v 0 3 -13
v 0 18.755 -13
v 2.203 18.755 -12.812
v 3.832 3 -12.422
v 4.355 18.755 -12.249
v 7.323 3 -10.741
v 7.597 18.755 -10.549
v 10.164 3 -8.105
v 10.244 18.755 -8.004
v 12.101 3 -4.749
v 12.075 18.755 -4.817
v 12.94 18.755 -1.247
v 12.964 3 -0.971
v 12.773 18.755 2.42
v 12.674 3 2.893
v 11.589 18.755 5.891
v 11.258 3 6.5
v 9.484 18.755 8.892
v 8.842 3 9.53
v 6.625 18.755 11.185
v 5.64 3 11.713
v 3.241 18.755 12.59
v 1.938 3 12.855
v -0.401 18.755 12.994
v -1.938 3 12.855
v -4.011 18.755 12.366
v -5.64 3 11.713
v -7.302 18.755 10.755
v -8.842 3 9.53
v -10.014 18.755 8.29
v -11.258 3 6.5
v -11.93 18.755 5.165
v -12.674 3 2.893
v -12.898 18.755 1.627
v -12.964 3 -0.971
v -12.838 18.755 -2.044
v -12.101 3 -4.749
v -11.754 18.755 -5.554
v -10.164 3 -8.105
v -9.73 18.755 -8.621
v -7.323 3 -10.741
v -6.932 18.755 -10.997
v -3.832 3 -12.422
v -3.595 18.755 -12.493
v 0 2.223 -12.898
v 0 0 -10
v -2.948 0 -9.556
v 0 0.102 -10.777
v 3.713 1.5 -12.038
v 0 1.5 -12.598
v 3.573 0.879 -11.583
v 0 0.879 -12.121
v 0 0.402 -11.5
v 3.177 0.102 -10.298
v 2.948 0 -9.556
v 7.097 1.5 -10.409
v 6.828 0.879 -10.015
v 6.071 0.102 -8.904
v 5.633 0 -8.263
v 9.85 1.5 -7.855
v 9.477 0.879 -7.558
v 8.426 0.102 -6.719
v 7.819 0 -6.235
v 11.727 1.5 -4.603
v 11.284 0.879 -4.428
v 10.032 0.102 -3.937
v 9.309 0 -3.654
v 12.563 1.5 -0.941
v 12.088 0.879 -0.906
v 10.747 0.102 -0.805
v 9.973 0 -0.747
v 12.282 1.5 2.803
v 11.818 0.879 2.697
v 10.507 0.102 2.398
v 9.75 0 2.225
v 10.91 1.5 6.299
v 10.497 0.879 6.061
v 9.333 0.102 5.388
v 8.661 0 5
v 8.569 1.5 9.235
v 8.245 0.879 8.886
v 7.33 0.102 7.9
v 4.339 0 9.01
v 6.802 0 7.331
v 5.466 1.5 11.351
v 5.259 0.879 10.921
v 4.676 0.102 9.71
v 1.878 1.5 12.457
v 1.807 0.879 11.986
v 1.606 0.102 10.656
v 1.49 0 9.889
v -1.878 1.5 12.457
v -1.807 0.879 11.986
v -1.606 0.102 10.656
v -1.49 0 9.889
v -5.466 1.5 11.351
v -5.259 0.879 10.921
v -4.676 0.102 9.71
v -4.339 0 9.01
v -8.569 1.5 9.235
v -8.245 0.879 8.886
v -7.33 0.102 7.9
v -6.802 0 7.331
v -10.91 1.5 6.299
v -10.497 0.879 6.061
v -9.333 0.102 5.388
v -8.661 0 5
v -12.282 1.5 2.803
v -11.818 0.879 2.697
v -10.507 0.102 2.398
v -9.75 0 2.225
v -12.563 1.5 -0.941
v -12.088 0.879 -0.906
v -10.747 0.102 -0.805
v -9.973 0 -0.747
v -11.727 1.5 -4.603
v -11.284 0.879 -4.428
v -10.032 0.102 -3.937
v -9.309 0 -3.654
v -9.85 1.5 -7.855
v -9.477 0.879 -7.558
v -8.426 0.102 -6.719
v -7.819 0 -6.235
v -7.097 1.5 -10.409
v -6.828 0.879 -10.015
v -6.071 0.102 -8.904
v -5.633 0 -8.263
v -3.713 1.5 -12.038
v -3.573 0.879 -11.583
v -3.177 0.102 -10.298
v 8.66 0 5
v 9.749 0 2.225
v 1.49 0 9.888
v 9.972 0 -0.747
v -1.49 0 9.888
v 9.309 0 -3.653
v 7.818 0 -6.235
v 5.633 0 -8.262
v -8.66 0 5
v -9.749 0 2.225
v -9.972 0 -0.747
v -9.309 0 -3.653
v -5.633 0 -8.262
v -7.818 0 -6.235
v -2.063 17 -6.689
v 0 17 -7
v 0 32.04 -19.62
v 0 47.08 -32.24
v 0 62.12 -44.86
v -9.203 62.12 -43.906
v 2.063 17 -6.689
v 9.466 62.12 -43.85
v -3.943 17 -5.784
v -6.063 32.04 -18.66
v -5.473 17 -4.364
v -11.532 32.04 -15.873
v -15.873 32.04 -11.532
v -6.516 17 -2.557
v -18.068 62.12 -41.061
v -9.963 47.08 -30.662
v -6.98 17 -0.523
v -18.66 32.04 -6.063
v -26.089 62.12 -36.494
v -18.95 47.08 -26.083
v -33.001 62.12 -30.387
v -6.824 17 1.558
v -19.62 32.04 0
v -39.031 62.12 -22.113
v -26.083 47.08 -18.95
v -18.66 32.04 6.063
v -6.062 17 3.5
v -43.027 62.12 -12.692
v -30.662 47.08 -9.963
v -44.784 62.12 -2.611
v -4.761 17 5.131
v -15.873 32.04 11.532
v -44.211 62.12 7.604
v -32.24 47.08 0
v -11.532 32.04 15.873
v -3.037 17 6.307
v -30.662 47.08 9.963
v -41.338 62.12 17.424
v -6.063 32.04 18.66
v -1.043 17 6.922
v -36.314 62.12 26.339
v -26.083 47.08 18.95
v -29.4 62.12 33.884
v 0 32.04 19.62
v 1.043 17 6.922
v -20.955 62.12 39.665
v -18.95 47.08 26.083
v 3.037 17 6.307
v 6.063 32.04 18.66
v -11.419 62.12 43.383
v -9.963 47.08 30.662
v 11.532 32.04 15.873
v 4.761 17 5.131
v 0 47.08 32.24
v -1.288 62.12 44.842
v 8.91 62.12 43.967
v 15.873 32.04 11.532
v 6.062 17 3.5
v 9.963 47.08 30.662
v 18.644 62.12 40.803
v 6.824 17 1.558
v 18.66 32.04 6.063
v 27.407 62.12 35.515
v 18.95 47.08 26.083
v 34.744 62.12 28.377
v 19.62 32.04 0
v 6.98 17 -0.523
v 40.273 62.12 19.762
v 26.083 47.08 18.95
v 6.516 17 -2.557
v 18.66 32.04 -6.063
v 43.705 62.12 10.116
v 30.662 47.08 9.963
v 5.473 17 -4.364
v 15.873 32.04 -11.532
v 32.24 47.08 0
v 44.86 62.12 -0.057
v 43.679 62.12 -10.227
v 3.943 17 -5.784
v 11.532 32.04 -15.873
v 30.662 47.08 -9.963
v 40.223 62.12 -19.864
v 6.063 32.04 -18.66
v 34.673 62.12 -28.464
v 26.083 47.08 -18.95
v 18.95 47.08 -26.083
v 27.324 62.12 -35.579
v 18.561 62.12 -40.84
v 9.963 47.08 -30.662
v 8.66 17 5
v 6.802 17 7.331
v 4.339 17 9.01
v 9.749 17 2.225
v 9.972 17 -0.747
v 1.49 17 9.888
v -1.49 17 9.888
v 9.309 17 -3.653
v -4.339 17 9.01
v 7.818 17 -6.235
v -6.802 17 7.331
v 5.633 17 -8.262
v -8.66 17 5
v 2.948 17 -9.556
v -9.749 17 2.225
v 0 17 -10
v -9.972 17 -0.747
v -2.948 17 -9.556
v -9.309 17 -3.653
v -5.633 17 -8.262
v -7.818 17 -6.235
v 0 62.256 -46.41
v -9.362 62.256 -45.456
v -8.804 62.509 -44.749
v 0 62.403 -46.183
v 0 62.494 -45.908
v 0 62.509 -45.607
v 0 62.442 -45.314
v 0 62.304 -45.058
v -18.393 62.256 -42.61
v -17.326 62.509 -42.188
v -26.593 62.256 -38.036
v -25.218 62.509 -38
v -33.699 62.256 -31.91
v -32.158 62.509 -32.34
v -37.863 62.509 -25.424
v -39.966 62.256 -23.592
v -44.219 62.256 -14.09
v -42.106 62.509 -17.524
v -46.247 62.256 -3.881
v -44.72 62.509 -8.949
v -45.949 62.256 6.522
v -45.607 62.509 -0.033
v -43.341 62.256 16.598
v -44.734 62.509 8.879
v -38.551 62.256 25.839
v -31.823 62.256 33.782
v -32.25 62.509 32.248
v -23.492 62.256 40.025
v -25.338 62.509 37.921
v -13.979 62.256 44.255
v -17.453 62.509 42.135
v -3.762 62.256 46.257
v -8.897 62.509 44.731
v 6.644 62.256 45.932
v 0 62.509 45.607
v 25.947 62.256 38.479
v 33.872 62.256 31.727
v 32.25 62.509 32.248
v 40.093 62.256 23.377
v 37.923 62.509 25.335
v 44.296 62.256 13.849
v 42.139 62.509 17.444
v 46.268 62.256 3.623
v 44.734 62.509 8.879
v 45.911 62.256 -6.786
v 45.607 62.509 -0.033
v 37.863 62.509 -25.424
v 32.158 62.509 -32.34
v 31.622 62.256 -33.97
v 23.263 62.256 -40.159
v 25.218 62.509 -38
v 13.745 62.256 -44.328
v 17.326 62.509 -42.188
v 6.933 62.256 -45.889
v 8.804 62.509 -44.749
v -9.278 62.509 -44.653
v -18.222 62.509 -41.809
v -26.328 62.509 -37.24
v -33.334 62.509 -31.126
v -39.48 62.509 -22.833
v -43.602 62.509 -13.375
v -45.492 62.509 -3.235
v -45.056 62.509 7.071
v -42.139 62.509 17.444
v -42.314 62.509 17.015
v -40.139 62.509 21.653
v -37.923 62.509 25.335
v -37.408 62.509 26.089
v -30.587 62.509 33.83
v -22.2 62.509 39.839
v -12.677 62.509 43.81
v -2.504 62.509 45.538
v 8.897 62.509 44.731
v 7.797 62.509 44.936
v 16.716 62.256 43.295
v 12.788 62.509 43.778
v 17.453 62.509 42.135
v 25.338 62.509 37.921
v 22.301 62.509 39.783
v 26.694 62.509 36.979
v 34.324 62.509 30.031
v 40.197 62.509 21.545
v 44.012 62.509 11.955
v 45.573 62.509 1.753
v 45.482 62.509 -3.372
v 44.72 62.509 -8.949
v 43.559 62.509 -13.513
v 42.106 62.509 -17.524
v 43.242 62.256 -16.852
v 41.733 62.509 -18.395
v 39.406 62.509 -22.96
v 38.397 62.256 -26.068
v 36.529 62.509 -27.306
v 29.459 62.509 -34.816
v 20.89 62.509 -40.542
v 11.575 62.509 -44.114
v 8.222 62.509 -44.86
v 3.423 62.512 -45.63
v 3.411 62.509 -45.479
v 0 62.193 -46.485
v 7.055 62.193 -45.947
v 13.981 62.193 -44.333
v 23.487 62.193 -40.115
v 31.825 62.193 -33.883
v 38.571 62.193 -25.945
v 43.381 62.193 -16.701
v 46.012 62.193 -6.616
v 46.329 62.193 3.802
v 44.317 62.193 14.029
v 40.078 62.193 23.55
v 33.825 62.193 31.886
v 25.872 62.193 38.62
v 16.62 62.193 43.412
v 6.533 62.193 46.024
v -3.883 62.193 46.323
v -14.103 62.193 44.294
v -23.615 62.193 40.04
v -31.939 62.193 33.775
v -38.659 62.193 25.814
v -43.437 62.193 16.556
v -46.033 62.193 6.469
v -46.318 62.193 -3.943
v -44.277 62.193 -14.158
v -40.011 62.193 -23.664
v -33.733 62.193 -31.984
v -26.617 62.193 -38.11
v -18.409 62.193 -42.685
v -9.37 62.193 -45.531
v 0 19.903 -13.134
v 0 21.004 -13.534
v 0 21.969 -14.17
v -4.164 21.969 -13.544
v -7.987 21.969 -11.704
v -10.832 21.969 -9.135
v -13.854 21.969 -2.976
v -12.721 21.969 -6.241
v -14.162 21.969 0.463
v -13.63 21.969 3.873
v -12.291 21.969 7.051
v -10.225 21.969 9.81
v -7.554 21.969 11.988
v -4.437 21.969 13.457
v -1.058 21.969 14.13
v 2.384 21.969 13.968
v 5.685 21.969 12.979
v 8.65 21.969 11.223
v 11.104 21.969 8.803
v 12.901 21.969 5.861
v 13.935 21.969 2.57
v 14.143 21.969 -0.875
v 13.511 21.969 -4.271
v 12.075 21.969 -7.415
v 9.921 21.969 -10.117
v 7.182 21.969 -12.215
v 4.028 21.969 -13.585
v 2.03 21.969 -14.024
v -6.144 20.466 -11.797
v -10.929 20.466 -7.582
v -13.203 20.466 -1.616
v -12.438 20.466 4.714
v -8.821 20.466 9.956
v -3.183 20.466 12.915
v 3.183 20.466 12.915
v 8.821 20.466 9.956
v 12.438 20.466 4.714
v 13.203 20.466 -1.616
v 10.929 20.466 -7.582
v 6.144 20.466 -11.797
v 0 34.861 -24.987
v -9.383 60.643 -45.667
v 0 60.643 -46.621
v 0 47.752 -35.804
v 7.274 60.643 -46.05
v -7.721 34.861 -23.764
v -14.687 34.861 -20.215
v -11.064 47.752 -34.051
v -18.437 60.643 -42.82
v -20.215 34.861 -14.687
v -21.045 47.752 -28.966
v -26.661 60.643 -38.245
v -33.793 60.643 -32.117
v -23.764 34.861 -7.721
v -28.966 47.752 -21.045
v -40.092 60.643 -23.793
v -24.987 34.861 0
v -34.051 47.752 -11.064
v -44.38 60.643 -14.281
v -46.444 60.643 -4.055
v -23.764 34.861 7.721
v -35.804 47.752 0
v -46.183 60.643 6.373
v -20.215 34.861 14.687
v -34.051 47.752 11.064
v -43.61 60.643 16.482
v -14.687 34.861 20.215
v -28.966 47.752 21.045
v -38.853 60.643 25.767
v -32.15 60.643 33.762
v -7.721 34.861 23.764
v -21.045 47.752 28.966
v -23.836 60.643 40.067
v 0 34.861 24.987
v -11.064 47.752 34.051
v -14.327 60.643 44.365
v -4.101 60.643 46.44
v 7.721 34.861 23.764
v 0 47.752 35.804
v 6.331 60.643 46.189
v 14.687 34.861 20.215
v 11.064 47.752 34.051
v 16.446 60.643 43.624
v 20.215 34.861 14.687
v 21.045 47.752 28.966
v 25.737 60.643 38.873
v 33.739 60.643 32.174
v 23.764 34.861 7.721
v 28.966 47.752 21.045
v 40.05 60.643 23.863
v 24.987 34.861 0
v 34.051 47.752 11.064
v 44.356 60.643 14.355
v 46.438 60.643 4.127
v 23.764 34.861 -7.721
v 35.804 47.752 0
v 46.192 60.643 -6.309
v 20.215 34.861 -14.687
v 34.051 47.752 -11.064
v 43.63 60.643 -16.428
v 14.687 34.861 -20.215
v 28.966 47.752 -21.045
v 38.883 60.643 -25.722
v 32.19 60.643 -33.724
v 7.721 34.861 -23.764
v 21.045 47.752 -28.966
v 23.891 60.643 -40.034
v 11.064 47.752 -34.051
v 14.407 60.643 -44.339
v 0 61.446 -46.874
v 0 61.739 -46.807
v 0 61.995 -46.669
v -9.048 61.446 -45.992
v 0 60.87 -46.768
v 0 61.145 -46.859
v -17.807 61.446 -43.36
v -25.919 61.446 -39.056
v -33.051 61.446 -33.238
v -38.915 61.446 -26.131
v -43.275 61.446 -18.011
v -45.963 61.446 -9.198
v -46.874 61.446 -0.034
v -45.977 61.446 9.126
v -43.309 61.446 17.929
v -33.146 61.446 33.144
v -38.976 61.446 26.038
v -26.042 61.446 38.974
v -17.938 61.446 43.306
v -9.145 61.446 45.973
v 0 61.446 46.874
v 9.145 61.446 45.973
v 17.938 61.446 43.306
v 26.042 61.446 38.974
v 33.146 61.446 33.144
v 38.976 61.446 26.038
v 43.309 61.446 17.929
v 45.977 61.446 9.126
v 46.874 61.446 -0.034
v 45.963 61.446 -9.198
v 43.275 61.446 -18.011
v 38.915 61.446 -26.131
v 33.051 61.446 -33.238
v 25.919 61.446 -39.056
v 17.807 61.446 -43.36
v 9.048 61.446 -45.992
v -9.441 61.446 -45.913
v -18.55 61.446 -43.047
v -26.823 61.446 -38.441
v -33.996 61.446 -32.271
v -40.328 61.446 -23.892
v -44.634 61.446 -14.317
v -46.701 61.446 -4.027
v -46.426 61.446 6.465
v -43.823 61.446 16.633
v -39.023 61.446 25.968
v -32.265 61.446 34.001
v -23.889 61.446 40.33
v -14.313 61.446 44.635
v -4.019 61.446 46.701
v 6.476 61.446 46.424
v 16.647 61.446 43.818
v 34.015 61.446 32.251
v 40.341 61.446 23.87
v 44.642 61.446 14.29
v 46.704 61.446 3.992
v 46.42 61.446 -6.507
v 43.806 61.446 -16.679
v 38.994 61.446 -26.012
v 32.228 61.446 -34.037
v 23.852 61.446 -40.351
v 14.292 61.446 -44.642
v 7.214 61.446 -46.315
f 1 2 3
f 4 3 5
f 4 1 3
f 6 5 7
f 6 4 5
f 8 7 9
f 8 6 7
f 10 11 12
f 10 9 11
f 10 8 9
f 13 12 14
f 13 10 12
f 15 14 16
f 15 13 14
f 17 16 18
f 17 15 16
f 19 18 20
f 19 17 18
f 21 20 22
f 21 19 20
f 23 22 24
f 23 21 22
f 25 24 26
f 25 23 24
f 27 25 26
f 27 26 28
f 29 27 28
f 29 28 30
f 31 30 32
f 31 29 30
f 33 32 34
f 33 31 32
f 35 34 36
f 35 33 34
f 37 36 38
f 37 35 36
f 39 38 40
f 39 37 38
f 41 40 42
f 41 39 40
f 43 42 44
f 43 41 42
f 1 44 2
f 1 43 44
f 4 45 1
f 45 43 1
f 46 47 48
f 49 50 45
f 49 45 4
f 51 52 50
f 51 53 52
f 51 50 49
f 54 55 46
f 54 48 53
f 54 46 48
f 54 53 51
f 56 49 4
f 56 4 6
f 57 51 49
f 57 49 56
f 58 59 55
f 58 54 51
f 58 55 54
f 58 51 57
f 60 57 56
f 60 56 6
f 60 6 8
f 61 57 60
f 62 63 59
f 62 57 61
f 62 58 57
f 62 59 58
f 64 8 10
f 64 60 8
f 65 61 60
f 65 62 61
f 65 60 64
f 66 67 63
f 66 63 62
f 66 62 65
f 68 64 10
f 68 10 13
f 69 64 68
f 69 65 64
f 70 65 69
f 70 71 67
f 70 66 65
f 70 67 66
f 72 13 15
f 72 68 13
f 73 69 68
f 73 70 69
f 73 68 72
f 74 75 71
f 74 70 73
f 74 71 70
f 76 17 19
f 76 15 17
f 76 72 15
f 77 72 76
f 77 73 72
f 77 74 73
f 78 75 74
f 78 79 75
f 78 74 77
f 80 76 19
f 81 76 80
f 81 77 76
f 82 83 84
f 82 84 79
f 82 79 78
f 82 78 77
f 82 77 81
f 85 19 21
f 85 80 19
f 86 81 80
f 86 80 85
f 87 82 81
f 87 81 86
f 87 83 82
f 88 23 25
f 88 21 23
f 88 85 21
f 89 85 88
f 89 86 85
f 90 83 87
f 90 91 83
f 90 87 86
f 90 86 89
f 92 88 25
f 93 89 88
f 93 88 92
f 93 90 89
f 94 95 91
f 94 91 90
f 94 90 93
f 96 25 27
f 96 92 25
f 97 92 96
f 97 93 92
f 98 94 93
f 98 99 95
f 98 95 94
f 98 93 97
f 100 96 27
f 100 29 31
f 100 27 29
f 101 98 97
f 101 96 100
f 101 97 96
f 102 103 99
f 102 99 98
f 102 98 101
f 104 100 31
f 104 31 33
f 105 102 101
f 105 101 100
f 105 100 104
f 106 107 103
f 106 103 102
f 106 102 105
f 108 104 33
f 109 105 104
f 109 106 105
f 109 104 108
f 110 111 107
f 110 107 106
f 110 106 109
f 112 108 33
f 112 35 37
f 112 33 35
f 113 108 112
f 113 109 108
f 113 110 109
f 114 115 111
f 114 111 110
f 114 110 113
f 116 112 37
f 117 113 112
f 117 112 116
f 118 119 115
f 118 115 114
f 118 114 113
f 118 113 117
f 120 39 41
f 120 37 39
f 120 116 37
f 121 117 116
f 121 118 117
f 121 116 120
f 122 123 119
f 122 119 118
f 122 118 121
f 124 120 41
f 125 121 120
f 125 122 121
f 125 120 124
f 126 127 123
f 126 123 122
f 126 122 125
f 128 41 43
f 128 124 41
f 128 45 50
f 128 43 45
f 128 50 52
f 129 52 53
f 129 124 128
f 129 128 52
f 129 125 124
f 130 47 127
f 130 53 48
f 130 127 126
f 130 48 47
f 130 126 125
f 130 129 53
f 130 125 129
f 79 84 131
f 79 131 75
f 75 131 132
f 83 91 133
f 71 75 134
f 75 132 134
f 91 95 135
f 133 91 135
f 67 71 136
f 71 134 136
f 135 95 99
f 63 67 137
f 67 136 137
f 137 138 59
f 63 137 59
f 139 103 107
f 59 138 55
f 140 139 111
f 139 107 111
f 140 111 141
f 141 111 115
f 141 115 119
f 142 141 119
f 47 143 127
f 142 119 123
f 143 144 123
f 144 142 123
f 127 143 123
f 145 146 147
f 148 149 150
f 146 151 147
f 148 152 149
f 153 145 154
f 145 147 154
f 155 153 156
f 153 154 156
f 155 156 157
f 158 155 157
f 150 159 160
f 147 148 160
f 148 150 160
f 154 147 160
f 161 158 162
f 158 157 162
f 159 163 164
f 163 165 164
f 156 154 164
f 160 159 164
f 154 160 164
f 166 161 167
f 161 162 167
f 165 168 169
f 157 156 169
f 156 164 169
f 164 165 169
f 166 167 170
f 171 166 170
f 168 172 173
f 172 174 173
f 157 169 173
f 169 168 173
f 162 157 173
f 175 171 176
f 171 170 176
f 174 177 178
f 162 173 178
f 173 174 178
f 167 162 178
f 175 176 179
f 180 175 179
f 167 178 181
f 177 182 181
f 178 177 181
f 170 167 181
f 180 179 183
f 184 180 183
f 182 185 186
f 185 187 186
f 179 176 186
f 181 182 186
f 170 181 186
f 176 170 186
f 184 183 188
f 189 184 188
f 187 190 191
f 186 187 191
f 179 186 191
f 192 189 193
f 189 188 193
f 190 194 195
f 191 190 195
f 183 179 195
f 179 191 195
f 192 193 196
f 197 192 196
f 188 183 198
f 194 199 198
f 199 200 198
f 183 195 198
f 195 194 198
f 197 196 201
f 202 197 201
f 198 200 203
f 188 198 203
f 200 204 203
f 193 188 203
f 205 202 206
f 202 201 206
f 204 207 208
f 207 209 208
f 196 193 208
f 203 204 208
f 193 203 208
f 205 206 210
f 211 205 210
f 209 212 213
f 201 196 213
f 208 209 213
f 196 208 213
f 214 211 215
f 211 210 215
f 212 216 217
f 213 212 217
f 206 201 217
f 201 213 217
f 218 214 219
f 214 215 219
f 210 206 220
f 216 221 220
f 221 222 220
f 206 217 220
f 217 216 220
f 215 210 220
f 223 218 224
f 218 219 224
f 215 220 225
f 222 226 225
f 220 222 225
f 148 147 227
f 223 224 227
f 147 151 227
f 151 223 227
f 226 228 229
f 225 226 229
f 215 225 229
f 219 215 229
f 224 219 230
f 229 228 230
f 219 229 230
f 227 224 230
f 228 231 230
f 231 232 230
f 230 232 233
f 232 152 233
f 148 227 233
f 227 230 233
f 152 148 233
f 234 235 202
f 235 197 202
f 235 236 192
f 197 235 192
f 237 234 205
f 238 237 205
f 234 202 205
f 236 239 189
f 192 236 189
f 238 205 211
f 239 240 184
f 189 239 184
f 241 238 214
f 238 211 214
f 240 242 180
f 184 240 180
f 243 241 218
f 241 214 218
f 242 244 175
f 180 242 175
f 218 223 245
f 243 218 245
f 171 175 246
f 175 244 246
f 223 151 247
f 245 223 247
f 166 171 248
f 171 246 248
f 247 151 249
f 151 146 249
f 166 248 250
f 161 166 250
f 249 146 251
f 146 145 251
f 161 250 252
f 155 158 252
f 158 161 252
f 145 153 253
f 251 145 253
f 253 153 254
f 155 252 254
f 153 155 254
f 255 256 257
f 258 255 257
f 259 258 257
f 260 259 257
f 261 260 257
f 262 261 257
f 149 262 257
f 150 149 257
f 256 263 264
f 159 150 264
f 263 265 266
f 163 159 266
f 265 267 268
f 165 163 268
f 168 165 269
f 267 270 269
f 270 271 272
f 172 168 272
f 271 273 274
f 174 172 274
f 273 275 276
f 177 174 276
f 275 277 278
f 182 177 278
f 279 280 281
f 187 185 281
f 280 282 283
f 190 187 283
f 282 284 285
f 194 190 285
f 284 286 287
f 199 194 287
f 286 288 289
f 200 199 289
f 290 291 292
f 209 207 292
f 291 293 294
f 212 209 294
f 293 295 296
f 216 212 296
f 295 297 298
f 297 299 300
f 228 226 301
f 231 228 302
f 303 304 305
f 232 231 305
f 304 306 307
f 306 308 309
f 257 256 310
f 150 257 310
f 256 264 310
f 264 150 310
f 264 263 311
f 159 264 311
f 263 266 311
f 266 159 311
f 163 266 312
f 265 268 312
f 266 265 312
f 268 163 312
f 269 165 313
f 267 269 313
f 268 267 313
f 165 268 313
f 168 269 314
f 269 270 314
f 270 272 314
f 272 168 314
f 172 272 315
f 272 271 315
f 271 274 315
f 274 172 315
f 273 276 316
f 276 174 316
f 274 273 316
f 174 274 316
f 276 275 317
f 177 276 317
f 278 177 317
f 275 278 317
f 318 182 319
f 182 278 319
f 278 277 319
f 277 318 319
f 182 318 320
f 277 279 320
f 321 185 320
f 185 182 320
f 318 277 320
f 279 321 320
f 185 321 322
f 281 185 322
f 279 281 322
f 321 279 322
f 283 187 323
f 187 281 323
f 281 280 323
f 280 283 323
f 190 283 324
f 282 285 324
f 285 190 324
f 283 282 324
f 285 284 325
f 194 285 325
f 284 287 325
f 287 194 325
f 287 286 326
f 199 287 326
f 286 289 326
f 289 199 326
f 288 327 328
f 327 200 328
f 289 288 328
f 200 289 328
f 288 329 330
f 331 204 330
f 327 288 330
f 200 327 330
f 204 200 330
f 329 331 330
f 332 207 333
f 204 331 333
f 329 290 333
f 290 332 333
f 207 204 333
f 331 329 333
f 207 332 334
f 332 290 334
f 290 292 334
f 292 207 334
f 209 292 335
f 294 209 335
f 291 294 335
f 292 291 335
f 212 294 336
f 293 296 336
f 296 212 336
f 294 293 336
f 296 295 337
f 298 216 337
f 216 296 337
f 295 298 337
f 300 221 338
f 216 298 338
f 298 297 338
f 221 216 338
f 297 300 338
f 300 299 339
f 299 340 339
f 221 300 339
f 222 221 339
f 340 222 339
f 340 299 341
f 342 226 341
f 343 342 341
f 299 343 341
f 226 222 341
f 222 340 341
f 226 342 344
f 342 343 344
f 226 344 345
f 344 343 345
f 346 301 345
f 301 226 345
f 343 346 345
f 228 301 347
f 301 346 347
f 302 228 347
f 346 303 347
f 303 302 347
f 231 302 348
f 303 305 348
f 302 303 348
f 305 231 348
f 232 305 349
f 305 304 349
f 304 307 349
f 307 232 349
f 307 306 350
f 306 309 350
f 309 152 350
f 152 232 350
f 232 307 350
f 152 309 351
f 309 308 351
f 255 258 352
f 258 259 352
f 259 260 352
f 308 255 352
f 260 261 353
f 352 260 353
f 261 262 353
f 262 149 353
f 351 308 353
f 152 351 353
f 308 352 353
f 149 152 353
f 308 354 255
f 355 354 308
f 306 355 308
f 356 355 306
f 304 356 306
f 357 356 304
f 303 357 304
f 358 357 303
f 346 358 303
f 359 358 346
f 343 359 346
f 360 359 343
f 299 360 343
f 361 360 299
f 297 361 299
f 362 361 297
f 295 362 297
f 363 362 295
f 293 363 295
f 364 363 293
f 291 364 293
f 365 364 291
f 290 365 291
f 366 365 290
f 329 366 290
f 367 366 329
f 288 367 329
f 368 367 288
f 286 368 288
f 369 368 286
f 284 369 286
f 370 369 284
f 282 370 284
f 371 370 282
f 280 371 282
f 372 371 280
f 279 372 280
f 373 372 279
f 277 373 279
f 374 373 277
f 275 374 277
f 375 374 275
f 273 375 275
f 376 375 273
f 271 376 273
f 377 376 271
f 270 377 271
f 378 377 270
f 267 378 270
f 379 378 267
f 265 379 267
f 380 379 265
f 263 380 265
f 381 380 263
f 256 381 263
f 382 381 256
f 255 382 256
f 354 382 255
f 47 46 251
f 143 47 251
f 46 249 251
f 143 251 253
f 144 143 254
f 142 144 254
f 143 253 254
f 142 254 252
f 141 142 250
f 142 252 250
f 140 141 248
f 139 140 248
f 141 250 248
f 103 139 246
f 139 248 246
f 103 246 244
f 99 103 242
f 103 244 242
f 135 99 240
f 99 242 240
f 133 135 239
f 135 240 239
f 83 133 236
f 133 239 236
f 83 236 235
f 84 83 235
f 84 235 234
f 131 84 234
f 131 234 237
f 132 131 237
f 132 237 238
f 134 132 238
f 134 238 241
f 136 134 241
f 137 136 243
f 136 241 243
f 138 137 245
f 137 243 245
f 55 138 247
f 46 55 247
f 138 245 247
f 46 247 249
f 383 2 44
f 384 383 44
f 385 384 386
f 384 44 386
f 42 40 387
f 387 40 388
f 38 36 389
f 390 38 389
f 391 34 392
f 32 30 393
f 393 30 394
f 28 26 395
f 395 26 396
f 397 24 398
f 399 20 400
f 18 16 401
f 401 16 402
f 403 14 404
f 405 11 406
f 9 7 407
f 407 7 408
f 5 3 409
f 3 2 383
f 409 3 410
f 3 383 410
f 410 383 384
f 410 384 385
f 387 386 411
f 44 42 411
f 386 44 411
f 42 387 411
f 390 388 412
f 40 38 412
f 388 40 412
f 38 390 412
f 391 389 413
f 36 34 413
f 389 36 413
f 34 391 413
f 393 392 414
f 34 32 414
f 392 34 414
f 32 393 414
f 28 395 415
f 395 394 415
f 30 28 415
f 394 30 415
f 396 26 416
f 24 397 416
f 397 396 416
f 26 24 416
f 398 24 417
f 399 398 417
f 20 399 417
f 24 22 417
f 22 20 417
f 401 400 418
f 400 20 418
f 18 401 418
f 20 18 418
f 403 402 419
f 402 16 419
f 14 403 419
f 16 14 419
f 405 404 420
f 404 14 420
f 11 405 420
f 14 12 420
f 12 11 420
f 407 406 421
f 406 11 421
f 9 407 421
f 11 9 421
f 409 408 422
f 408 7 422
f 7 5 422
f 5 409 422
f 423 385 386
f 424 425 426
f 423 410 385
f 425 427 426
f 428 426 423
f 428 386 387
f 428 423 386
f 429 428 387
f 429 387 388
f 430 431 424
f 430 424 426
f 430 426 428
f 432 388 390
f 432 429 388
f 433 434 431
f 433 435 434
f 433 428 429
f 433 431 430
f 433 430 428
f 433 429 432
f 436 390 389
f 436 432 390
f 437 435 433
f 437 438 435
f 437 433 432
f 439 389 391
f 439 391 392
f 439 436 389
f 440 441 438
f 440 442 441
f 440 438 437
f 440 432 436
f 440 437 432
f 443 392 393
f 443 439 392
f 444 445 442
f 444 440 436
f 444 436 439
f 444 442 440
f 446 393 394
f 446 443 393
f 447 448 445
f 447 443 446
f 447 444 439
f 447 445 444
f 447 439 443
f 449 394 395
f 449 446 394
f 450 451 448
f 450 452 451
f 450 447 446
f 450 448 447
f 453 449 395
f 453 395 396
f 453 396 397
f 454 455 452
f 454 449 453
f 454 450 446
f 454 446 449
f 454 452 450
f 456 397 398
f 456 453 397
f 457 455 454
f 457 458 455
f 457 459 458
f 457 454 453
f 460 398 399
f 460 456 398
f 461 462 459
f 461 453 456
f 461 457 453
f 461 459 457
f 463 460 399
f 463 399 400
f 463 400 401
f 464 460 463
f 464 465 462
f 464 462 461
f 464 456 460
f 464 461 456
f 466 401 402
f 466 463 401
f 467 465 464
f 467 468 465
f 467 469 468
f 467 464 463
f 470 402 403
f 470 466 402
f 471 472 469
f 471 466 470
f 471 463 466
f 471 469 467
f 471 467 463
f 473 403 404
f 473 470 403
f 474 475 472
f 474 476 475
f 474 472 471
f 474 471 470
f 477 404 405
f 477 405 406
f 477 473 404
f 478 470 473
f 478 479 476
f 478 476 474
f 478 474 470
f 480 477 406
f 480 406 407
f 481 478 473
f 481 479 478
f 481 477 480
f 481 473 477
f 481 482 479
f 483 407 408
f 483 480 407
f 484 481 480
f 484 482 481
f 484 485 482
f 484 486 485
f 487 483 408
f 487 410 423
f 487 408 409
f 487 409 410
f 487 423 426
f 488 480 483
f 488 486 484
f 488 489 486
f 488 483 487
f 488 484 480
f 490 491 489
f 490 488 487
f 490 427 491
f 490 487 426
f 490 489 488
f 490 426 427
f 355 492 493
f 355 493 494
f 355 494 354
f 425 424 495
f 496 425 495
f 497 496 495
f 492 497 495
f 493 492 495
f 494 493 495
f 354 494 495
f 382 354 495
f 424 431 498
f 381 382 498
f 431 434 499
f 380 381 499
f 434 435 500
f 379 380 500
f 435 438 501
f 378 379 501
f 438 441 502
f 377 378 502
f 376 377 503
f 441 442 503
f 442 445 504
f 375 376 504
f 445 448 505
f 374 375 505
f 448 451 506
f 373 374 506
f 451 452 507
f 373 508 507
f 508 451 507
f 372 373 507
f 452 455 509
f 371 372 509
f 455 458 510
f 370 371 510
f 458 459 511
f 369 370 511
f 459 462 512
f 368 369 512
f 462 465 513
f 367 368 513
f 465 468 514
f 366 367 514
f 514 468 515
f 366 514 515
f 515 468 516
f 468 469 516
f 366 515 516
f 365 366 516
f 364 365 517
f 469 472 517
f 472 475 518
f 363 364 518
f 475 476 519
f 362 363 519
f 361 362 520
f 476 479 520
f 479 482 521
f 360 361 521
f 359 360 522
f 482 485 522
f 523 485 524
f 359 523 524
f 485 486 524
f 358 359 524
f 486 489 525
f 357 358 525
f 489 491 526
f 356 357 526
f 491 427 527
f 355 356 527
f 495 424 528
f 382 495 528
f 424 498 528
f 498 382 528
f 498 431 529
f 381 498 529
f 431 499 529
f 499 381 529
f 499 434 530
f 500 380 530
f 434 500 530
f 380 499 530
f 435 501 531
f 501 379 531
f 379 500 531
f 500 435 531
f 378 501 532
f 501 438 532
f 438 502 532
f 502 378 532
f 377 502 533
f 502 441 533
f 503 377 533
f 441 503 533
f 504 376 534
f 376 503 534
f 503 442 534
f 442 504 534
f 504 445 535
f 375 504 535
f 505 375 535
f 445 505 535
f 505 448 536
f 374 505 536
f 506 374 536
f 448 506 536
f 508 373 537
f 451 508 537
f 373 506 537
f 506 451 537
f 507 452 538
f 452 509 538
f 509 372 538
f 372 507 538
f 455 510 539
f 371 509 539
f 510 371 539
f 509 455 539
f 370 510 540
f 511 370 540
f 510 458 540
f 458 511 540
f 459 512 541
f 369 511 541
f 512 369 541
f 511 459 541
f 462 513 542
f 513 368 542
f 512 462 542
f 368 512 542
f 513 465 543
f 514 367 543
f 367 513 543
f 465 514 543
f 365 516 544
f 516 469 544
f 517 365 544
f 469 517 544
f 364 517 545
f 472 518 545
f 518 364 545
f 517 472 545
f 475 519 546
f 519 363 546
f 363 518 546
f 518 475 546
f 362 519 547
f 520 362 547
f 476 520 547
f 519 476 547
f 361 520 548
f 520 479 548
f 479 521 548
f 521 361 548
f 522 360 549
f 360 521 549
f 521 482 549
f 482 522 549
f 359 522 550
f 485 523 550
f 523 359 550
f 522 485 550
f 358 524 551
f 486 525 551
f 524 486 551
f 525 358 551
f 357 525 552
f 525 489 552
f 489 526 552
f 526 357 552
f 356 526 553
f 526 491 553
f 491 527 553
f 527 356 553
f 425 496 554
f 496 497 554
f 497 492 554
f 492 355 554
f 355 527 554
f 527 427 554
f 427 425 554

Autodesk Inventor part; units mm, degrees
ref_plane "YZ Plane" through (0, 0, 0) normal (1, 0, 0) x (0, 1, 0)
ref_plane "XZ Plane" through (0, 0, 0) normal (0, 1, 0) x (-1, 0, 0)
ref_plane "XY Plane" through (0, 0, 0) normal (0, 0, 1) x (1, 0, 0)
sketch "Esquisse2" plane through (0, 0, 0) normal (1, 0, 0) x (0, 1, 0)
  line L0 (0, -10) -> (17, -10)
  line L1 (17, -7) -> (62.9627, -45.5673)
  line L2 (17, -7) -> (77, -7) construction
  line L3 (62.9627, -45.5673) -> (61.4855, -47.3277)
  line L4 (61.4855, -47.3277) -> (17, -10)
  line L5 (17, -10) -> (17, -13)
  line L6 (17, -13) -> (20.5753, -13)
  line L7 (17, -13) -> (0, -13)
  line L8 (0, -13) -> (0, -10)
  line L9 (17, -7) -> (17, -10)
  line L10 (0, 0) -> (24.971, 0)
  dimension "d0" = 10
  dimension "d1" = 17
  dimension "d2" = 40
  dimension "d4" = 3
  dimension "d5" = 60
  dimension "d7" = 3
  dimension "d8" = 7
revolve "Révolution1" add sketch "Esquisse2" angle 360 about axis through (0, 0, 0) along (0, 1, 0)
fillet "Congé1" radius 5 1 edges at (0, 20.5753, 13)
fillet "Congé2" radius 3 1 edges at (0, 0, 13)
fillet "Congé3" radius 1.1 2 edges at (0, 61.4855, 47.3277) (0, 62.9627, 45.5673)
properties part number "entonnoir"
